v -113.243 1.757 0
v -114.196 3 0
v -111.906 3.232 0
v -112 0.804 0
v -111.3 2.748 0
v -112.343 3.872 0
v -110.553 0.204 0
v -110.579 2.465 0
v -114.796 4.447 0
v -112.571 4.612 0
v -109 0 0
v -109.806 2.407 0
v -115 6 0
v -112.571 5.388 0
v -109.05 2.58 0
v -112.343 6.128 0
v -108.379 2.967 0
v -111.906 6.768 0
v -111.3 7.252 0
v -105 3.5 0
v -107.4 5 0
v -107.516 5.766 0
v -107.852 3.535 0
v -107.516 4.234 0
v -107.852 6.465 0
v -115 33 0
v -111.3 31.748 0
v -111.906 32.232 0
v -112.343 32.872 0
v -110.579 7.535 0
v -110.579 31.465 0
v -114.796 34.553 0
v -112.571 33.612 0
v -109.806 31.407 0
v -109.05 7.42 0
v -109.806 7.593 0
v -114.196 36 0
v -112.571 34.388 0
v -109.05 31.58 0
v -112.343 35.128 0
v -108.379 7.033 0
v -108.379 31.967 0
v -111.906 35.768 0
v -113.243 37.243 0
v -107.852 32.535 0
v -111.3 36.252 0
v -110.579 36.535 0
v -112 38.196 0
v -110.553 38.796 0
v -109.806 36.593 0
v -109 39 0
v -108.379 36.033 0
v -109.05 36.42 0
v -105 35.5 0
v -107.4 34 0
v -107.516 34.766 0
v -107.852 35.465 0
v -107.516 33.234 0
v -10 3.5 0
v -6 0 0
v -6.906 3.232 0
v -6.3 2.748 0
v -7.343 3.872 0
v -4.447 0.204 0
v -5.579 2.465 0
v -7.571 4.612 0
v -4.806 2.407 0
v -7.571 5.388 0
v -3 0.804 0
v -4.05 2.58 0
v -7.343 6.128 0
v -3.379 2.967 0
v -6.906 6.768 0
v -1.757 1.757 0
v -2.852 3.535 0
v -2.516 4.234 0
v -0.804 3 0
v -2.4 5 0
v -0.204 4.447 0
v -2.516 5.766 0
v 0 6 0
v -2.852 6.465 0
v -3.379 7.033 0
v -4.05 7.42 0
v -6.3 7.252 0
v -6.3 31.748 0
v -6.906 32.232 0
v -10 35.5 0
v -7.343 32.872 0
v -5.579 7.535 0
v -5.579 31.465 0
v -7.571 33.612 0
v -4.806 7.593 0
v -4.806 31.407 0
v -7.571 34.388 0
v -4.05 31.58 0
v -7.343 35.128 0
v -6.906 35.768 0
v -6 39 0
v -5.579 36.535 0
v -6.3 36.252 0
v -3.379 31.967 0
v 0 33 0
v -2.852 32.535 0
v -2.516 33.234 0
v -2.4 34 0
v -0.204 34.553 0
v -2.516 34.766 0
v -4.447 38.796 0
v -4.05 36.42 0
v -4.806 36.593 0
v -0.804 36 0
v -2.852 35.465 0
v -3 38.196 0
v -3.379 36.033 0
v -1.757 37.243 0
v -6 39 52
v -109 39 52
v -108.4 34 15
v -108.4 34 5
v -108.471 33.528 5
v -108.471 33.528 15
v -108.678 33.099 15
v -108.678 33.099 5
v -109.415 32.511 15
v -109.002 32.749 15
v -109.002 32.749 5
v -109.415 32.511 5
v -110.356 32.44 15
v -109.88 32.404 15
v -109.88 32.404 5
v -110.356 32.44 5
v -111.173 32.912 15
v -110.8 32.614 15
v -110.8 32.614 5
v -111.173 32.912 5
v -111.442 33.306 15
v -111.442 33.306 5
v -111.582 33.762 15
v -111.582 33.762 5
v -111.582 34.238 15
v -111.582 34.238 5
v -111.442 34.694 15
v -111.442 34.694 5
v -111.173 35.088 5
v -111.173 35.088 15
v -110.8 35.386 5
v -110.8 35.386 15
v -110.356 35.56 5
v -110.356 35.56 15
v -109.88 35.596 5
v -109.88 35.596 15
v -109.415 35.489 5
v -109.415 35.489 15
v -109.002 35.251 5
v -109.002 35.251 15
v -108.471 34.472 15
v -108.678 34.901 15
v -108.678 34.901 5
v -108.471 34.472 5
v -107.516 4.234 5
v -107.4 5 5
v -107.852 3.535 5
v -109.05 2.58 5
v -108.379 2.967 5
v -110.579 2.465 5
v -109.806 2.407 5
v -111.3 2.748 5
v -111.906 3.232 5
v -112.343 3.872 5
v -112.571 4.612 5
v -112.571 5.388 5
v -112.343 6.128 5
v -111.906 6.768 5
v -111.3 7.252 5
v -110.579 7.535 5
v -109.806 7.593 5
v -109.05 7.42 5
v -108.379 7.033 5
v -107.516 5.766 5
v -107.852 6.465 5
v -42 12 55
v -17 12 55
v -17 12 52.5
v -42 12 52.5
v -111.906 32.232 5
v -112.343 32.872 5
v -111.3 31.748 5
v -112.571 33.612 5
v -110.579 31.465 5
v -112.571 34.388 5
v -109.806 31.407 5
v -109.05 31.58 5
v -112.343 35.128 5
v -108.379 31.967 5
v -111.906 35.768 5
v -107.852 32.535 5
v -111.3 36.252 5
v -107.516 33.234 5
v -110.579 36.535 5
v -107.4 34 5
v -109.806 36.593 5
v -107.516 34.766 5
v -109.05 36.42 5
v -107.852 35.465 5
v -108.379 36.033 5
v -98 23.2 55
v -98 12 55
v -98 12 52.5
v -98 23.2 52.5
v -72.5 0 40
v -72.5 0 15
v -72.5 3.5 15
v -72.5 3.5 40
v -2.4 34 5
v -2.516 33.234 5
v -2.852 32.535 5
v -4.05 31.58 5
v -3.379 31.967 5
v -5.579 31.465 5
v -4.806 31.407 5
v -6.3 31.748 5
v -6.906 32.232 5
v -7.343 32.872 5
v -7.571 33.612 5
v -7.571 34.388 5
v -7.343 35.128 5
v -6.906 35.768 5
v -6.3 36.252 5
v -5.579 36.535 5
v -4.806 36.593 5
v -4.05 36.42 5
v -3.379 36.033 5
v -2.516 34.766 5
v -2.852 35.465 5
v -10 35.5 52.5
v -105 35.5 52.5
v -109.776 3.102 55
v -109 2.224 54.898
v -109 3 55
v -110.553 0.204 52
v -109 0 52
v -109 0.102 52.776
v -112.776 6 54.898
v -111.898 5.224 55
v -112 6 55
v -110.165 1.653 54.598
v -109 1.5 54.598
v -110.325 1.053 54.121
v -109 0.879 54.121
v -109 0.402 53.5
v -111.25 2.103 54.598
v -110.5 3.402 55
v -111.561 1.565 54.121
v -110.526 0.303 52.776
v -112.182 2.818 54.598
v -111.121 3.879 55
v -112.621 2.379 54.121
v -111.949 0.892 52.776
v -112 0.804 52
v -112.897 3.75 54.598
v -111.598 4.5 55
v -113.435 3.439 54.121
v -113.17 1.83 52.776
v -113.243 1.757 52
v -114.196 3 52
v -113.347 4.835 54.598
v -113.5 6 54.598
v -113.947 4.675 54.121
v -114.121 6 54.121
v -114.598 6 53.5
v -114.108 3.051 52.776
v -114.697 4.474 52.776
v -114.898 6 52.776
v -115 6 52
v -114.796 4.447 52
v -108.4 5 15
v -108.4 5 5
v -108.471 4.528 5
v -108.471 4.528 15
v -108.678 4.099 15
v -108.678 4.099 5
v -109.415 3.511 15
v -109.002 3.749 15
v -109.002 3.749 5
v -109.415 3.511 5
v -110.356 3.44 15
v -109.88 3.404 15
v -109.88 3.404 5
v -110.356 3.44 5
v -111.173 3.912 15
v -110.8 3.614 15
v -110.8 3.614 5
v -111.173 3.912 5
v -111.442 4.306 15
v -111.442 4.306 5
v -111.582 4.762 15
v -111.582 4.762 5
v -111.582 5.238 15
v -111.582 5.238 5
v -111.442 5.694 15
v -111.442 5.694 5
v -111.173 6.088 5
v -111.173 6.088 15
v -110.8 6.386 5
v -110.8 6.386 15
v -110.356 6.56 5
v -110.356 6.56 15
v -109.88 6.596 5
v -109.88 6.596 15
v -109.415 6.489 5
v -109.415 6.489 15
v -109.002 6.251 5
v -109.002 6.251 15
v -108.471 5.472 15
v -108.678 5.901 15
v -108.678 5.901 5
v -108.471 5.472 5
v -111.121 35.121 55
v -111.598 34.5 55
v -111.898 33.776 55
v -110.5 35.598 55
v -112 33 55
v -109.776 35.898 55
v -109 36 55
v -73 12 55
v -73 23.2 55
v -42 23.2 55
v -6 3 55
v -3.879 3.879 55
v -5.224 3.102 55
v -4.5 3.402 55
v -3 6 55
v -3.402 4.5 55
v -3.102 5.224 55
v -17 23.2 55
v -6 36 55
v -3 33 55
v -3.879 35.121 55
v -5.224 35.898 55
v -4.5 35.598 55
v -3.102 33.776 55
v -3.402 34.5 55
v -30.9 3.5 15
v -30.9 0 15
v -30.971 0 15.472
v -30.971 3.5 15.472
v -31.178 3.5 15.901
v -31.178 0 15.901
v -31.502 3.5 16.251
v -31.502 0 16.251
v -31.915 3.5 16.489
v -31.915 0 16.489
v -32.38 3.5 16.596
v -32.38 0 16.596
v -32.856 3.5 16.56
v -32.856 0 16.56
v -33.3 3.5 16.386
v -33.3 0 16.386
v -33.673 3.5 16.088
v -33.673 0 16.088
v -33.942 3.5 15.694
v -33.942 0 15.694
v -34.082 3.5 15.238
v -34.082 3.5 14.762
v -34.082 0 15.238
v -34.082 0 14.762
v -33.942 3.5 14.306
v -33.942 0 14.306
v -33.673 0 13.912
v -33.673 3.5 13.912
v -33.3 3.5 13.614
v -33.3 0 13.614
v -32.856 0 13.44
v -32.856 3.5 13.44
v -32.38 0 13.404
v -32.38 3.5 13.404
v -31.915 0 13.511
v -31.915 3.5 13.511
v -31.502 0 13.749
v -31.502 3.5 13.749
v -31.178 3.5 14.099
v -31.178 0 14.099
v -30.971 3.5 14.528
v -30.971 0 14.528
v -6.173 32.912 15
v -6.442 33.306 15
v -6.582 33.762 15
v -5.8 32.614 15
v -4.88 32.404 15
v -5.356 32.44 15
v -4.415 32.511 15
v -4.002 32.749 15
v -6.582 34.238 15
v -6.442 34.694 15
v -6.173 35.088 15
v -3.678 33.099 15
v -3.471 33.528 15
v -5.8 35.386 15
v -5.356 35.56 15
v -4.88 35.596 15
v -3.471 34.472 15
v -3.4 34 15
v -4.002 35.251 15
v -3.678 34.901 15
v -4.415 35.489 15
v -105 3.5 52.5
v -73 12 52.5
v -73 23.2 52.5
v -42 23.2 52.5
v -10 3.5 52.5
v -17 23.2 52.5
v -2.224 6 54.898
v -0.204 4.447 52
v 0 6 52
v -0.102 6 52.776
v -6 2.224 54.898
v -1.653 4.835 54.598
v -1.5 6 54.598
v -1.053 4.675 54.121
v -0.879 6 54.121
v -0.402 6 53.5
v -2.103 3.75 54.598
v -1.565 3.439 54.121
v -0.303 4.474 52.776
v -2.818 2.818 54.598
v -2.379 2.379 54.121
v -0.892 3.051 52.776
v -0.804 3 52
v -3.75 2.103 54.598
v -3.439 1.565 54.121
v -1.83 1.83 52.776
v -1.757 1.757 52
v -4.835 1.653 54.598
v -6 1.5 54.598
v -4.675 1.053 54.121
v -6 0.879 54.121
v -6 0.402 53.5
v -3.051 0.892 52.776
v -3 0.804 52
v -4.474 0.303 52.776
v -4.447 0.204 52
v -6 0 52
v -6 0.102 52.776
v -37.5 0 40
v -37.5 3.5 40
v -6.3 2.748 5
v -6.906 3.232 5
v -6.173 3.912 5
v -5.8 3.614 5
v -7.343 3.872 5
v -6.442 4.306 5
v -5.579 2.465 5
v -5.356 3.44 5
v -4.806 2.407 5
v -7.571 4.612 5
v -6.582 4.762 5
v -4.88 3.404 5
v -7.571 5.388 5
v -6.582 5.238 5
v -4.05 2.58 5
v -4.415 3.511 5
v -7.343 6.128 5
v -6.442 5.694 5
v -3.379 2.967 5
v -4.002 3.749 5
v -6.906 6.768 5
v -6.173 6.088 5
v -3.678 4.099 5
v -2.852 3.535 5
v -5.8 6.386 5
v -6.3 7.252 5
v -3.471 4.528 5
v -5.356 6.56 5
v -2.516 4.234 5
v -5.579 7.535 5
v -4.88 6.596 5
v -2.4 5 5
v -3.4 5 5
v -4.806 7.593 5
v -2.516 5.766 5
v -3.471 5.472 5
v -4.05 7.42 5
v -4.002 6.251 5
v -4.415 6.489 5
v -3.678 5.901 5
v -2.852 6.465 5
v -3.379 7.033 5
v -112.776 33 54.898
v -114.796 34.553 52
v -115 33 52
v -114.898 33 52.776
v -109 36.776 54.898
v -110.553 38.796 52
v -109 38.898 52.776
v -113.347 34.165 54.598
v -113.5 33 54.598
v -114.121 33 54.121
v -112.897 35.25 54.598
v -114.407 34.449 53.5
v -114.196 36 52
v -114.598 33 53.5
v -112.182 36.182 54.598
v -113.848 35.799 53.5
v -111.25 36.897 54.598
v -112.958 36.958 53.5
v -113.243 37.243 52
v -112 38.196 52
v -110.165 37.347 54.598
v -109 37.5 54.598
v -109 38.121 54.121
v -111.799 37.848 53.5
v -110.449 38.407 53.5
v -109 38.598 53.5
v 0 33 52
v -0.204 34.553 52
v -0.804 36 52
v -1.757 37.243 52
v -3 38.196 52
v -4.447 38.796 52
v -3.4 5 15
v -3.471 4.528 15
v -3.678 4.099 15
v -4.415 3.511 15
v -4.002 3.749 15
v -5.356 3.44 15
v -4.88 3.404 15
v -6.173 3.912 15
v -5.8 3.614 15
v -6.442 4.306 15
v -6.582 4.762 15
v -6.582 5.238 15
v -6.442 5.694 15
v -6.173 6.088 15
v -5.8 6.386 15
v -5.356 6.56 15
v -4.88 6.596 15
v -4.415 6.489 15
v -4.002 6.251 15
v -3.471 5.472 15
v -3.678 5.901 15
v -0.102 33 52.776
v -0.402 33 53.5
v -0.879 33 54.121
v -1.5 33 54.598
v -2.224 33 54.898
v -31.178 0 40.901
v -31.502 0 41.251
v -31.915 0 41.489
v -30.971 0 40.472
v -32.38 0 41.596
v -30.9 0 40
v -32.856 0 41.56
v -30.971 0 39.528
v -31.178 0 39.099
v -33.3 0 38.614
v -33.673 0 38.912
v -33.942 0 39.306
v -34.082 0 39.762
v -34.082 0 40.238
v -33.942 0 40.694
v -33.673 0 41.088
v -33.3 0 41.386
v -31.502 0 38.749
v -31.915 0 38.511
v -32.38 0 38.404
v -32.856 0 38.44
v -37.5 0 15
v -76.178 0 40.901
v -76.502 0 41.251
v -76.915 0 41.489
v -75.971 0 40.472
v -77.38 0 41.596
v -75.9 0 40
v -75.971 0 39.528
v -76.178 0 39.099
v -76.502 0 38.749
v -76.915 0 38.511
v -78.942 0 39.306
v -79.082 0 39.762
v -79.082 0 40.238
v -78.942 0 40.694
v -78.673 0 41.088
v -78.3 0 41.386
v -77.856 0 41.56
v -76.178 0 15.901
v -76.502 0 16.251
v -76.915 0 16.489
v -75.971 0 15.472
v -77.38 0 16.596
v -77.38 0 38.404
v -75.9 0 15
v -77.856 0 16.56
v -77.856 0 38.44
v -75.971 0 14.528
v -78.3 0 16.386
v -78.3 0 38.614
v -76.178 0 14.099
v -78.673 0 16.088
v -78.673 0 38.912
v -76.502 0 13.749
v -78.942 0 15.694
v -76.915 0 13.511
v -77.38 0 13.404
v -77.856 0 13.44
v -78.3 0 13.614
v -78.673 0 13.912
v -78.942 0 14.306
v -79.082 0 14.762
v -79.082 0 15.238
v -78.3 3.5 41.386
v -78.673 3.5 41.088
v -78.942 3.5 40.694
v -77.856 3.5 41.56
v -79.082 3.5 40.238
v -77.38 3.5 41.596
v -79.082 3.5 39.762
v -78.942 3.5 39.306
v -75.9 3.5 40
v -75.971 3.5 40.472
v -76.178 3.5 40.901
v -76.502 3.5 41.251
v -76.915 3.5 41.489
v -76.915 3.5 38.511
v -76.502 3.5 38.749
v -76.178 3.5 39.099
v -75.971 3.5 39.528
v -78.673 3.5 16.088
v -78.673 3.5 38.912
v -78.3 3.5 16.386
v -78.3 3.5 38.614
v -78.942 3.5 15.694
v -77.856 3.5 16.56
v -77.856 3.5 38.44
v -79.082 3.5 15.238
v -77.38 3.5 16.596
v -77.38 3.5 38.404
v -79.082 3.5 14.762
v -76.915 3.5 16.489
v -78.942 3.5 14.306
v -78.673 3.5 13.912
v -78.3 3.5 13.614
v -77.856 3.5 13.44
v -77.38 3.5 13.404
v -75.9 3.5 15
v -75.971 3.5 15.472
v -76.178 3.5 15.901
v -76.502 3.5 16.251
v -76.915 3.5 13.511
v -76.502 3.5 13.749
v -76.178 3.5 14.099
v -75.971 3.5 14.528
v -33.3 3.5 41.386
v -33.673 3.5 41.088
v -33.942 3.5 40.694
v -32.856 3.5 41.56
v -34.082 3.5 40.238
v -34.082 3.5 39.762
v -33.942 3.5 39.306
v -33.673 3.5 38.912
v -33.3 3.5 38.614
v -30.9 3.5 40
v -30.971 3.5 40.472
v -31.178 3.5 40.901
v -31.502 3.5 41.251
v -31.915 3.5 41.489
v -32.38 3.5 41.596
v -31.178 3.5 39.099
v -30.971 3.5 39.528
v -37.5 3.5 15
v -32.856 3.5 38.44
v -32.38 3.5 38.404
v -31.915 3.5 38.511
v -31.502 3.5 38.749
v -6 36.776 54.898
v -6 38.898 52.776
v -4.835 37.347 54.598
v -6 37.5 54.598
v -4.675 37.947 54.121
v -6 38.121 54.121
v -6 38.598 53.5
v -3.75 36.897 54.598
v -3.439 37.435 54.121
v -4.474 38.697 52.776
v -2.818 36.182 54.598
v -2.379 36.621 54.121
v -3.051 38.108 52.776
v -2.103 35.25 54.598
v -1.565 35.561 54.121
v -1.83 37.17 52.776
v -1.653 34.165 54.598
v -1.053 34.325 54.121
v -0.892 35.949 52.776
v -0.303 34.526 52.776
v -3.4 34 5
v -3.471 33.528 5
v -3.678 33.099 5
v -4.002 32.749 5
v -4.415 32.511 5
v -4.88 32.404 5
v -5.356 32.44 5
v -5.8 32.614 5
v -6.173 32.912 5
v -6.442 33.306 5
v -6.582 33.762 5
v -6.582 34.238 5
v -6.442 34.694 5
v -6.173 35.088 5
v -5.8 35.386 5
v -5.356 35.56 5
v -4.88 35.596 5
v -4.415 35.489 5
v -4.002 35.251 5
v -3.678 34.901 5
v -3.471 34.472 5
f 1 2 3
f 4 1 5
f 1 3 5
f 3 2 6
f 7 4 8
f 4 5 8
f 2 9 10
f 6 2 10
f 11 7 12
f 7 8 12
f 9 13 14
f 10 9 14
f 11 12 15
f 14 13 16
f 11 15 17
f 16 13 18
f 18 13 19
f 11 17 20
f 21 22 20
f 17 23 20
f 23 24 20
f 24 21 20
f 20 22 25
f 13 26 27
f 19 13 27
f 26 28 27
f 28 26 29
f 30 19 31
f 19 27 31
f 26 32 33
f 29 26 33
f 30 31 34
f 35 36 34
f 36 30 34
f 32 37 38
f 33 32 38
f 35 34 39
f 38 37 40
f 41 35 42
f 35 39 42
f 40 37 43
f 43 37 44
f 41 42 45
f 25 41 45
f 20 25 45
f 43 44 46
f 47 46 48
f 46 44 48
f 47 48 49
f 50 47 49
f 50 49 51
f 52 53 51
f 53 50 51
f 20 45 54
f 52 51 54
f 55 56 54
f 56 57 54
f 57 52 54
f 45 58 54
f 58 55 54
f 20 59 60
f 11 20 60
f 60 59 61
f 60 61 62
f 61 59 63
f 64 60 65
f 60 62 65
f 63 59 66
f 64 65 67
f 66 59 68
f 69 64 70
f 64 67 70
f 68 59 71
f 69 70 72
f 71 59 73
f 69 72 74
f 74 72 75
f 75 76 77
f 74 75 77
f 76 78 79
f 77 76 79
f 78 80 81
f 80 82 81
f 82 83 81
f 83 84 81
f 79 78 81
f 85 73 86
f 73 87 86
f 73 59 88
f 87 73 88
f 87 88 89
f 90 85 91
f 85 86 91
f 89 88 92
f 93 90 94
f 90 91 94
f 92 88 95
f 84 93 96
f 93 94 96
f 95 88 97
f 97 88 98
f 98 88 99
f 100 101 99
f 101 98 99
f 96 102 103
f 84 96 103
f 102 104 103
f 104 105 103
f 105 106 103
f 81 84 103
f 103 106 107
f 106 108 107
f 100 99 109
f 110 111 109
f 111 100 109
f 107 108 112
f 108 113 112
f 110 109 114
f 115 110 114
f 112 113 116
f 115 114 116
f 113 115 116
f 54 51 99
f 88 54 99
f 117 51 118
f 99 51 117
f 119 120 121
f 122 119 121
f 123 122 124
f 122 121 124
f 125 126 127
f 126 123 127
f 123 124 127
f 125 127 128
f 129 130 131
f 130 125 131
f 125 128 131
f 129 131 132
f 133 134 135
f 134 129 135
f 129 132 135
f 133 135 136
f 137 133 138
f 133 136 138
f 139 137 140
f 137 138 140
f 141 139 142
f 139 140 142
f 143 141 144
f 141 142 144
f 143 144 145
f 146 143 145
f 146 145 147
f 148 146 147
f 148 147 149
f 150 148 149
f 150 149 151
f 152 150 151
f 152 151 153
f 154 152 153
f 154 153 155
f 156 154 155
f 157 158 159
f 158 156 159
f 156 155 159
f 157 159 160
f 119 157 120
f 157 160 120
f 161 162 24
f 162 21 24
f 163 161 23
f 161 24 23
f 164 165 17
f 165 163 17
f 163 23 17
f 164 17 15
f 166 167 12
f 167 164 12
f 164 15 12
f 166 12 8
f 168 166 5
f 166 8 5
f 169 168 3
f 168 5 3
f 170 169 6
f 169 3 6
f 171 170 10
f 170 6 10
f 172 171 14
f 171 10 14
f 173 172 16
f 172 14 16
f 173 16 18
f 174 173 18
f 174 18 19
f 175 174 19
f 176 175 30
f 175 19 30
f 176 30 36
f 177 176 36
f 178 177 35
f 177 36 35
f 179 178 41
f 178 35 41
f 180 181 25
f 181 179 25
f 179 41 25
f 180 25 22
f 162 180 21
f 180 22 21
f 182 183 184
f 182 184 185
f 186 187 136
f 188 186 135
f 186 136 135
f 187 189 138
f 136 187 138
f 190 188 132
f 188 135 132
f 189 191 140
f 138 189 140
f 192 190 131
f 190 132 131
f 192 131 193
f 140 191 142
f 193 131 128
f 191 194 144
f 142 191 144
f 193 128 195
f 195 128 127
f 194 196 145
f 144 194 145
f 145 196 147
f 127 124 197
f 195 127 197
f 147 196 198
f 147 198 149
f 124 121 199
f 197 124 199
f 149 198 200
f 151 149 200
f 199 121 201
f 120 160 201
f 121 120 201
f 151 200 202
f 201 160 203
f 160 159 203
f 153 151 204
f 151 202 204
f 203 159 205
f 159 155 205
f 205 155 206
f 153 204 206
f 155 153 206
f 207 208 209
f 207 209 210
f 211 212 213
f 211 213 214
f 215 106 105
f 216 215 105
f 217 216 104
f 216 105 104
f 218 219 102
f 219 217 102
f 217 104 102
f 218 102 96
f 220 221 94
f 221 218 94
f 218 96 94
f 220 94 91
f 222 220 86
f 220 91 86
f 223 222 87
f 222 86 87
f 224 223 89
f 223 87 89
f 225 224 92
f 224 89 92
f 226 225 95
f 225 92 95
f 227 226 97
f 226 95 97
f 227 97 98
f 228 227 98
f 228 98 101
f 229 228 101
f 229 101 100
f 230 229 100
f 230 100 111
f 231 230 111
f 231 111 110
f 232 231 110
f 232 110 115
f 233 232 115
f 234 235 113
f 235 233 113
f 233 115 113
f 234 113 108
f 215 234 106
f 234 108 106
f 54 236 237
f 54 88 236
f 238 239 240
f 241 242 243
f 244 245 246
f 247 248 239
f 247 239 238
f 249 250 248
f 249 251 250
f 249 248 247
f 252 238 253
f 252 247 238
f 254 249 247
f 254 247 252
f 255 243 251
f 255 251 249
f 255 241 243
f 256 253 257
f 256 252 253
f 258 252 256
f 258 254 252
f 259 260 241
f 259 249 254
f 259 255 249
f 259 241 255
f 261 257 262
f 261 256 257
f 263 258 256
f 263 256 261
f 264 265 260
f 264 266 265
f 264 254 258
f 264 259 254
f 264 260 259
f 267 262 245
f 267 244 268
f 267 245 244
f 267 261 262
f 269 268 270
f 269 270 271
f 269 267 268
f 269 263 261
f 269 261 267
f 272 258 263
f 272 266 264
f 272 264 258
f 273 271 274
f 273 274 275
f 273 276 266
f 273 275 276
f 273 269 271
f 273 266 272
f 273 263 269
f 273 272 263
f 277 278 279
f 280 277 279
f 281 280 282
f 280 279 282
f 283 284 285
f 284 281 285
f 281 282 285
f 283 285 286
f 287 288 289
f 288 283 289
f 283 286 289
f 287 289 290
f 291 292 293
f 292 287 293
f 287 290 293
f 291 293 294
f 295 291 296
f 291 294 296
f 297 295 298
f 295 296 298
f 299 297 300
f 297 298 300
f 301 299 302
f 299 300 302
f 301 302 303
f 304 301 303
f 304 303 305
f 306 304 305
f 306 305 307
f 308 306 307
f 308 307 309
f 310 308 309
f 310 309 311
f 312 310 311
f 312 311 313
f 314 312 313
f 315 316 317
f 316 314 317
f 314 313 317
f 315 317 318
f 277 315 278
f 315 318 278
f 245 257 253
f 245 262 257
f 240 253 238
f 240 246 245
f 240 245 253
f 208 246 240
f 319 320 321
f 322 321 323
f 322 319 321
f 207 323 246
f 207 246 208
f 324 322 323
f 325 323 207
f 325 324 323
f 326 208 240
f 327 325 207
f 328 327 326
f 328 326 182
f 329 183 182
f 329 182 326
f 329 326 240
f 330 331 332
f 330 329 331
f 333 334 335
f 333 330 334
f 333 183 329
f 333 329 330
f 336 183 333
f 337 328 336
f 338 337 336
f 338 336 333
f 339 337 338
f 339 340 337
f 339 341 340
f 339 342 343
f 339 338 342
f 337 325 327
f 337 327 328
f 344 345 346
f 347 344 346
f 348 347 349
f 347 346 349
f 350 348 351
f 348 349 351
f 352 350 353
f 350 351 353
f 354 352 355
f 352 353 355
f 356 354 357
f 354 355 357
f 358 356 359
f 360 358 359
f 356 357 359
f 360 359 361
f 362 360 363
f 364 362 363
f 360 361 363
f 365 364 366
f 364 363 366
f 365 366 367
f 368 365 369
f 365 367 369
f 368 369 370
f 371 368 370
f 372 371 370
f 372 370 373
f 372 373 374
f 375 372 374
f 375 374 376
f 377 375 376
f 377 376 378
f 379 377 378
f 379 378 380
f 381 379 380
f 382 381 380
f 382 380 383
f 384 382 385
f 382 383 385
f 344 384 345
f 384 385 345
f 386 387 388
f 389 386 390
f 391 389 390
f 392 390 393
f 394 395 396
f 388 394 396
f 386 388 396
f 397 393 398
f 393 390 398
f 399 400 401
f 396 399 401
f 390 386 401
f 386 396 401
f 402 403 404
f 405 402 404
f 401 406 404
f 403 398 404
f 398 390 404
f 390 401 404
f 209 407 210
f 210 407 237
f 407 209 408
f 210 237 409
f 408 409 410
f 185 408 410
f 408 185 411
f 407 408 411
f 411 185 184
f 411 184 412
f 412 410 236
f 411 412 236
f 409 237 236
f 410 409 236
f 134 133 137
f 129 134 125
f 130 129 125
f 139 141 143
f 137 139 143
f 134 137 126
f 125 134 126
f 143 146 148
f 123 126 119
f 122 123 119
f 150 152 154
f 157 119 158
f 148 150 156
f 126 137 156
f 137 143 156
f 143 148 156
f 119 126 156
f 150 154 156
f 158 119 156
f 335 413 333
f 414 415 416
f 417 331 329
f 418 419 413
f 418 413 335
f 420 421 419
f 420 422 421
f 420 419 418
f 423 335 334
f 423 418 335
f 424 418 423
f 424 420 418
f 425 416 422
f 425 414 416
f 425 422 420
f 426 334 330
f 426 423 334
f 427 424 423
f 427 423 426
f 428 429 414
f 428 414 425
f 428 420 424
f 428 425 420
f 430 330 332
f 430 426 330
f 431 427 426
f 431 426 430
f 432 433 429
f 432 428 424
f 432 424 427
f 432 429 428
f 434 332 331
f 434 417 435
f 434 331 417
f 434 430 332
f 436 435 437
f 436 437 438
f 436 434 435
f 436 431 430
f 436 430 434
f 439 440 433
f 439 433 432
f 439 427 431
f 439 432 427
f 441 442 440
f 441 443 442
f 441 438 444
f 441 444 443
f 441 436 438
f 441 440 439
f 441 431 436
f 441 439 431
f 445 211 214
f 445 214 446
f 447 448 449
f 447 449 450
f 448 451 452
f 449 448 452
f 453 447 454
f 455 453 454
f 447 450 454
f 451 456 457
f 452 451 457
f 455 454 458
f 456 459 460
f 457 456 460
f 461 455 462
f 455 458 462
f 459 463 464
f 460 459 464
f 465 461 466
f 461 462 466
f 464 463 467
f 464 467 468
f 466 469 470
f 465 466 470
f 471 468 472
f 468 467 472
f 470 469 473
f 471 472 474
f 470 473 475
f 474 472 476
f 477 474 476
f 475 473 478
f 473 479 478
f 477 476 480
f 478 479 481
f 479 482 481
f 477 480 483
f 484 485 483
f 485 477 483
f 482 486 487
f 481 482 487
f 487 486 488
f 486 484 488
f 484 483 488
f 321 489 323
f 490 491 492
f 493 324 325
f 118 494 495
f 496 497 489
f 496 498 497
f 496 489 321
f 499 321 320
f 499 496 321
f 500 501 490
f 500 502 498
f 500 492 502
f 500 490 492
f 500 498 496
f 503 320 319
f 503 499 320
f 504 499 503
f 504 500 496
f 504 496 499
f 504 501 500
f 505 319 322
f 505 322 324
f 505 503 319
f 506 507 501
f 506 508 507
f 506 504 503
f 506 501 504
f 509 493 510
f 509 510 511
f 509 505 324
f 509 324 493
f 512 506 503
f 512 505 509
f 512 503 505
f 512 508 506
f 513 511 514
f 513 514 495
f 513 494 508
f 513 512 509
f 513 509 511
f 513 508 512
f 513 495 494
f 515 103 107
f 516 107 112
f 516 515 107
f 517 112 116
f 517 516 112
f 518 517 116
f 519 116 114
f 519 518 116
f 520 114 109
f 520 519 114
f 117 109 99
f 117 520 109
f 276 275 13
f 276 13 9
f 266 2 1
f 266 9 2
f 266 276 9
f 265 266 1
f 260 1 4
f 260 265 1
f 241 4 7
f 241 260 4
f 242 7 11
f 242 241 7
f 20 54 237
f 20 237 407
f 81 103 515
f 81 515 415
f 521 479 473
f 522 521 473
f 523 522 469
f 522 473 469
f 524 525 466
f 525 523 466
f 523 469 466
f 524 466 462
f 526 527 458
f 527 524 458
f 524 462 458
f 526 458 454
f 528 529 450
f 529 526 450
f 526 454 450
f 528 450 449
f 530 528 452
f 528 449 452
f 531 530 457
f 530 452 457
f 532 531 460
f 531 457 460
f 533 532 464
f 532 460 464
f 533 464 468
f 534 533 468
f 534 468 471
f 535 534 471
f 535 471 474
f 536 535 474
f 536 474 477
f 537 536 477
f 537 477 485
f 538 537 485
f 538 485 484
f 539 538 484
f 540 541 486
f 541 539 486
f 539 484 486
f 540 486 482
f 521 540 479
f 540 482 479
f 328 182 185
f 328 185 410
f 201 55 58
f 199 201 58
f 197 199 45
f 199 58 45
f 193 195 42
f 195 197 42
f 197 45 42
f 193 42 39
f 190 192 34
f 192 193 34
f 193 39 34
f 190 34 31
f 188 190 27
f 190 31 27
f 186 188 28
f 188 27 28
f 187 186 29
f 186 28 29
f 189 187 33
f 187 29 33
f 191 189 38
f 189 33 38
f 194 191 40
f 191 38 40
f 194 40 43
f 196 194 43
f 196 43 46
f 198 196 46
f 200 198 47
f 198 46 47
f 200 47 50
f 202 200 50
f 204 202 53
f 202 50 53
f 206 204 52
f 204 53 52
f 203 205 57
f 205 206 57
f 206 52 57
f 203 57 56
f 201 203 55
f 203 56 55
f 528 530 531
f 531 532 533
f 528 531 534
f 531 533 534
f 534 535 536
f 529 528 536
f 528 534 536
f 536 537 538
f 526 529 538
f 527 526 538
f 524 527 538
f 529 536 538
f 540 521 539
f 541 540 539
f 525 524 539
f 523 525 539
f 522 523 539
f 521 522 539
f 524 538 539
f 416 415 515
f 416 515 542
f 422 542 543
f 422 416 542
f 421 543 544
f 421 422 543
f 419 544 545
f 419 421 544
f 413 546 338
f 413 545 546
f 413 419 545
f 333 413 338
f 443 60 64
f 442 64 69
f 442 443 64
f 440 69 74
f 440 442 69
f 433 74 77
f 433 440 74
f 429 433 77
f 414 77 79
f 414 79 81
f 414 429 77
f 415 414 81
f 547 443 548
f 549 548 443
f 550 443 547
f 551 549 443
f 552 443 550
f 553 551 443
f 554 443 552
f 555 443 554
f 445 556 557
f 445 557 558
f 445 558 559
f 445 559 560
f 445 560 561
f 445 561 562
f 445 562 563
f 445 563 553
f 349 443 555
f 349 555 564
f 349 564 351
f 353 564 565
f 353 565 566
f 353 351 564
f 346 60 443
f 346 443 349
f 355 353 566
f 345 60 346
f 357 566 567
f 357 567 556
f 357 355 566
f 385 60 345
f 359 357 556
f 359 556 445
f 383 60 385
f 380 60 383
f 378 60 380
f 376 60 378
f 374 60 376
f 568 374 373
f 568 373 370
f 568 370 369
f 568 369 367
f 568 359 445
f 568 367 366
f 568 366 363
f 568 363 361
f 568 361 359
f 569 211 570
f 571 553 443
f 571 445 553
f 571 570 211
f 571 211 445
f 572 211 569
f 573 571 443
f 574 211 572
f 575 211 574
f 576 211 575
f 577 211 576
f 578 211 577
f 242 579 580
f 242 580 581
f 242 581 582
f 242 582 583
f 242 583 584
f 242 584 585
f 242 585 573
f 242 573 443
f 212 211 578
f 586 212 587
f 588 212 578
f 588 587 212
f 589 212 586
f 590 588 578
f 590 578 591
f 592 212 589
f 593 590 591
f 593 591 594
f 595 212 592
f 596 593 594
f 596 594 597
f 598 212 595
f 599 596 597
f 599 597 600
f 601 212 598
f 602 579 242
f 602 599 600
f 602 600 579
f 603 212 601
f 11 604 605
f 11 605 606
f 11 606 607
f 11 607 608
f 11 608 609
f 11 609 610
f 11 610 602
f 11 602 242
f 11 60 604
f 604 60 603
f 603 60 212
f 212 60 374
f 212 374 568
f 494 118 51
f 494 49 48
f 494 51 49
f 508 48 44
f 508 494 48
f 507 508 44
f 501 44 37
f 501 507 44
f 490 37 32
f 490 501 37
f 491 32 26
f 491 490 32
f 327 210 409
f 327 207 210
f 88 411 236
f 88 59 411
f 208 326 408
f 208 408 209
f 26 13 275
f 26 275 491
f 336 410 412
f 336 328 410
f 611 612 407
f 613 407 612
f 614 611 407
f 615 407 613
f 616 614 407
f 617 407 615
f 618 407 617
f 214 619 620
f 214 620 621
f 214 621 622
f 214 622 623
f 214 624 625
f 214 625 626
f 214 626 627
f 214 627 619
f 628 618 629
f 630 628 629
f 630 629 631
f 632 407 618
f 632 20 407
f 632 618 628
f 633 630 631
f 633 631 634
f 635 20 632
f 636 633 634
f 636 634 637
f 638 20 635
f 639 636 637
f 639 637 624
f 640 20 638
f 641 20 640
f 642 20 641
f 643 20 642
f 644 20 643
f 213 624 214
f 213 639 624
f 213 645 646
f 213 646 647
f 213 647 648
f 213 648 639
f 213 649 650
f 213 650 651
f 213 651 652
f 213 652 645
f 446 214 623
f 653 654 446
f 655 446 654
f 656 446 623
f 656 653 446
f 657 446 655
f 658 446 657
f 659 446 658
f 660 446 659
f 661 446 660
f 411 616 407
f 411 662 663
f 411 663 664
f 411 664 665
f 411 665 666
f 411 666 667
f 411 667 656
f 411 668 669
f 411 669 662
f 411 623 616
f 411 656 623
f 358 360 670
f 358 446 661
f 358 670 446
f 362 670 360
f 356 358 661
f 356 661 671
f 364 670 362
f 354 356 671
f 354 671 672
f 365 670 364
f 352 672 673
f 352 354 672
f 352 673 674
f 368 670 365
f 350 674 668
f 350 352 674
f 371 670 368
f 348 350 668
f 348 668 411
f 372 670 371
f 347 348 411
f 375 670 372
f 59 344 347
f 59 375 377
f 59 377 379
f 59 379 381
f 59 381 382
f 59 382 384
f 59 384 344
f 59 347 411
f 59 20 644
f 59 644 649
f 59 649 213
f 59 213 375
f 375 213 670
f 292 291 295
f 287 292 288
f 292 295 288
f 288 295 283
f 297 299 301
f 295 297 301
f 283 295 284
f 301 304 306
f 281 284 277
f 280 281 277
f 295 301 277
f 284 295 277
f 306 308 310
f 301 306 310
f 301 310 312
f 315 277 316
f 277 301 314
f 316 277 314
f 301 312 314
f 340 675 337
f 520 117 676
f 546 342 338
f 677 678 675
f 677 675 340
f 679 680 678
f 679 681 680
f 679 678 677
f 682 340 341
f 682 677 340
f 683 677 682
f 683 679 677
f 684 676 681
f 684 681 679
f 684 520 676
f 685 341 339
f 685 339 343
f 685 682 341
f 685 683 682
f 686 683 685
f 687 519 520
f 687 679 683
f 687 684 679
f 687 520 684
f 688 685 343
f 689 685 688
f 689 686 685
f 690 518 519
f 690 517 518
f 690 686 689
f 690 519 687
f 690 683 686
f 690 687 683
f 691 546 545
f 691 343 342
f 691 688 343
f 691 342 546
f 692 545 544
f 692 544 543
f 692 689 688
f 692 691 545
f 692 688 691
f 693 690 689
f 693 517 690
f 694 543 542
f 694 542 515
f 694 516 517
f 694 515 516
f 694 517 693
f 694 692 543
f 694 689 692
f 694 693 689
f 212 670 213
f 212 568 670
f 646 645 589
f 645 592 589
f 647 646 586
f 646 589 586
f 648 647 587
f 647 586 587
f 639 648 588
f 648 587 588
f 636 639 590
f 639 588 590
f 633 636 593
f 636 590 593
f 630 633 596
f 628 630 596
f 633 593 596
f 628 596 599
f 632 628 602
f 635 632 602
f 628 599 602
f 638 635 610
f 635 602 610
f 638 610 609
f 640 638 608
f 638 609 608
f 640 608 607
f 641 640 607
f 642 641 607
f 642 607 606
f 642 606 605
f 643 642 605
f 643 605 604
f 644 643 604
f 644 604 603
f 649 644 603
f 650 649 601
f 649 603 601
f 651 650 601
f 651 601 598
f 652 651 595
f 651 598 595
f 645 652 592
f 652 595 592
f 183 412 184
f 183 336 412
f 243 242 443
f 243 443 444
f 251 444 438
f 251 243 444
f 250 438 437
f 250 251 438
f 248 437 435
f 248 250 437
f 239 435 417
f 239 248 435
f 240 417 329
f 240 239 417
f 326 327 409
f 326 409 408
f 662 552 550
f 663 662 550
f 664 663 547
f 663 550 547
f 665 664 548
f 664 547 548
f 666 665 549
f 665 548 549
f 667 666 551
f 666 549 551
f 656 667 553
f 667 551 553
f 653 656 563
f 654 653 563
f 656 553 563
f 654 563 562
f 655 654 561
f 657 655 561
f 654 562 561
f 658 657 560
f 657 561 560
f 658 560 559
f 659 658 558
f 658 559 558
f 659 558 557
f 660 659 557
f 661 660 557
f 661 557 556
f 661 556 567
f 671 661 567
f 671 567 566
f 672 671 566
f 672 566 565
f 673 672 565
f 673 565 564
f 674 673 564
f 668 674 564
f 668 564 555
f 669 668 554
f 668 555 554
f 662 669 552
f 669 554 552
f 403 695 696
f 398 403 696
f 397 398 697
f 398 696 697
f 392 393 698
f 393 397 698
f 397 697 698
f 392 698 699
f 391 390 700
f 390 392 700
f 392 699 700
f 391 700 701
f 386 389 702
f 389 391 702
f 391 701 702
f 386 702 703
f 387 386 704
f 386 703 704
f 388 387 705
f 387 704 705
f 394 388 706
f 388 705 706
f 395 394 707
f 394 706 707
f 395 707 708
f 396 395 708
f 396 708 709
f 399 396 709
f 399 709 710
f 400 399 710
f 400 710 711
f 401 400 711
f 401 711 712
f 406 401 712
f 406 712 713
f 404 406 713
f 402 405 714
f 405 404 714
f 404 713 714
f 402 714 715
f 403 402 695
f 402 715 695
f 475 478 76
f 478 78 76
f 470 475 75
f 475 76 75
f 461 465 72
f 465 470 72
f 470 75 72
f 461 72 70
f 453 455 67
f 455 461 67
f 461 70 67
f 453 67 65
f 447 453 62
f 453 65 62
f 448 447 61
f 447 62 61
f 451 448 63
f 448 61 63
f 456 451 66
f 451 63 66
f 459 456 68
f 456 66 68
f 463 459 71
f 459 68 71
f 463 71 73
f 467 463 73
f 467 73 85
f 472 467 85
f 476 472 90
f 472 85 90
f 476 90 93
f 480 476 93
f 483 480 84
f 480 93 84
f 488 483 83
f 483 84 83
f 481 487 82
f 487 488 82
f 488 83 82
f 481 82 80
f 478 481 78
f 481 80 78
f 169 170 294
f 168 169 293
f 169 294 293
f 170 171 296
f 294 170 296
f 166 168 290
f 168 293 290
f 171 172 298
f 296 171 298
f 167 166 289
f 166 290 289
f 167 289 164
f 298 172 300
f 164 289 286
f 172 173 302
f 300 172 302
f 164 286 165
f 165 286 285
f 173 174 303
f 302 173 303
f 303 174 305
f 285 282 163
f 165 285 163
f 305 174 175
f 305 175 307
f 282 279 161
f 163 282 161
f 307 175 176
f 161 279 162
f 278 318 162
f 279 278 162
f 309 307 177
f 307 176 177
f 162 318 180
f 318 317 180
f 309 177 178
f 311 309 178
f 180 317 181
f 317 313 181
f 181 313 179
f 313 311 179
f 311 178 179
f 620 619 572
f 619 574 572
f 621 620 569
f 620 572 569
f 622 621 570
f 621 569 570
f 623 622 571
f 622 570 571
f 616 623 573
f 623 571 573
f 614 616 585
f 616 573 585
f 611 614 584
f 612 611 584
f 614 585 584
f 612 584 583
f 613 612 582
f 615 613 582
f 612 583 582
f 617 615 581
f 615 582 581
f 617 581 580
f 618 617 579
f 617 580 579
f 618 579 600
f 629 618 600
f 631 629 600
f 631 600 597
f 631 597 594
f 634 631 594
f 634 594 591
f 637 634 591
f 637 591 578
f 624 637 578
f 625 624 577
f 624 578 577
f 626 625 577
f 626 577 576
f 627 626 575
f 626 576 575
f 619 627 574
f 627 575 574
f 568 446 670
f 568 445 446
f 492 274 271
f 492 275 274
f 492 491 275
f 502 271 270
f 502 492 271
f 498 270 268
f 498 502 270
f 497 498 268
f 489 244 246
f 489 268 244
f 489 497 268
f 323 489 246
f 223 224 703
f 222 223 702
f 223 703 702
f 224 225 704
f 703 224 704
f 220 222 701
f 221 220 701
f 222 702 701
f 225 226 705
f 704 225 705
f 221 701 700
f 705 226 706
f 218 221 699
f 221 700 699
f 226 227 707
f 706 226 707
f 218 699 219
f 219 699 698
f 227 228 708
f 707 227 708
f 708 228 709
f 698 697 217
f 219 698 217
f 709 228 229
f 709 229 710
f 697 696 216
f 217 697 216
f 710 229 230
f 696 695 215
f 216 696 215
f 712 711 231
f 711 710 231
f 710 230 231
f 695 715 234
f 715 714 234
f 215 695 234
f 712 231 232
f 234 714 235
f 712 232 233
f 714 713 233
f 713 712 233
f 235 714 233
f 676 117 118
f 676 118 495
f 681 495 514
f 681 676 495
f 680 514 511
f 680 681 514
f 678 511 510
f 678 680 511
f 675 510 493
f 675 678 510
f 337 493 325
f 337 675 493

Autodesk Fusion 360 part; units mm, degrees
sketch "Sketch1" plane through (0, 0, 0) normal (0, 0, 1) x (1, 0, 0)
  line L0 (0, 0) -> (-115, 0)
  line L1 (-115, 0) -> (-115, 39)
  line L2 (-115, 39) -> (0, 39)
  line L3 (0, 39) -> (0, 0)
  circle A0 centre (-5, 34) radius 2.6
  circle A1 centre (-5, 34) radius 1.6
  circle A2 centre (-5, 5) radius 2.6
  circle A3 centre (-5, 5) radius 1.6
  circle A4 centre (-110, 5) radius 2.6
  circle A5 centre (-110, 5) radius 1.6
  circle A6 centre (-110, 34) radius 2.6
  circle A7 centre (-110, 34) radius 1.6
  line L4 (-10, 35.5) -> (-105, 35.5)
  line L5 (-105, 35.5) -> (-105, 3.5)
  line L6 (-105, 3.5) -> (-10, 3.5)
  line L7 (-10, 3.5) -> (-10, 35.5)
  dimension "d1" = 115
  dimension "d2" = 39
  dimension "d3" = 5.2
  dimension "d4" = 5
  dimension "d5" = 5
  dimension "d6" = 3.2
  dimension "d7" = 5.2
  dimension "d8" = 5
  dimension "d9" = 5
  dimension "d10" = 3.2
  dimension "d11" = 5.2
  dimension "d12" = 5
  dimension "d13" = 5
  dimension "d14" = 3.2
  dimension "d15" = 5.2
  dimension "d16" = 5
  dimension "d17" = 5
  dimension "d18" = 3.2
  dimension "d19" = 95
  dimension "d20" = 32
  dimension "d21" = 10
  dimension "d22" = 3.5
extrude "Extrude1" add sketch "Sketch1" along normal blind 55 contours L0 L1 L2 L3 | A0 | A1 | A2 | A3 | A4 | A5 | A6 | A7 | L4 L5 L6 L7
extrude "Extrude2" cut sketch "Sketch1" along normal blind 52.5 contours L4 L5 L6 L7
extrude "Extrude3" cut sketch "Sketch1" along normal blind 5 contours A0 | A2 | A4 | A6
extrude "Extrude4" cut sketch "Sketch1" along normal blind 15 contours A1 | A3 | A5 | A7
sketch "Sketch2" plane through (0, 0, 0) normal (0, 1, 0) x (1, 0, 0)
  line L0 (-27.5, -10) -> (-82.5, -10)
  line L1 (-82.5, -10) -> (-82.5, -45)
  line L2 (-82.5, -45) -> (-27.5, -45)
  line L3 (-27.5, -45) -> (-27.5, -10)
  line L4 (-37.5, -15) -> (-72.5, -15)
  line L5 (-72.5, -15) -> (-72.5, -40)
  line L6 (-72.5, -40) -> (-37.5, -40)
  line L7 (-37.5, -40) -> (-37.5, -15)
  circle A0 centre (-32.5, -15) radius 1.6
  circle A1 centre (-32.5, -40) radius 1.6
  circle A2 centre (-77.5, -15) radius 1.6
  circle A3 centre (-77.5, -40) radius 1.6
  line L8 (0, 0) -> (-115, 0)
  line L9 (0, 0) -> (0, -55)
  dimension "d31" = 55
  dimension "d32" = 35
  dimension "d33" = 35
  dimension "d34" = 25
  dimension "d35" = 10
  dimension "d36" = 5
  dimension "d37" = 3.2
  dimension "d38" = 5
  dimension "d39" = 5
  dimension "d40" = 3.2
  dimension "d41" = 5
  dimension "d42" = 5
  dimension "d43" = 3.2
  dimension "d44" = 5
  dimension "d45" = 5
  dimension "d46" = 3.2
  dimension "d47" = 5
  dimension "d48" = 5
  dimension "d49" = 10
  dimension "d50" = 27.5
extrude "Extrude5" cut sketch "Sketch2" along normal blind 15 contours L4 L5 L6 L7
extrude "Extrude6" cut sketch "Sketch2" along normal blind 10 contours A0 | A1 | A2 | A3
ref_plane "WorkPlane1" through (0, 0, 60) normal (0, 0, 1) x (1, 0, 0)
sketch "Sketch3" plane through (0, 0, 60) normal (0, 0, 1) x (1, 0, 0)
  line L0 (-98, 23.2) -> (-73, 23.2)
  line L1 (-73, 23.2) -> (-73, 12)
  line L2 (-73, 12) -> (-98, 12)
  line L3 (-98, 12) -> (-98, 23.2)
  line L4 (-42, 23.2) -> (-17, 23.2)
  line L5 (-17, 23.2) -> (-17, 12)
  line L6 (-17, 12) -> (-42, 12)
  line L7 (-42, 12) -> (-42, 23.2)
  line L8 (0, 39) -> (-115, 39)
  line L9 (-99, 30.7) -> (-72, 30.7)
  line L10 (-72, 30.7) -> (-72, 3.7)
  line L11 (-72, 3.7) -> (-99, 3.7)
  line L12 (-99, 3.7) -> (-99, 30.7)
  line L13 (-43, 30.7) -> (-16, 30.7)
  line L14 (-16, 30.7) -> (-16, 3.7)
  line L15 (-16, 3.7) -> (-43, 3.7)
  line L16 (-43, 3.7) -> (-43, 30.7)
  line L17 (-115, 0) -> (0, 0)
  line L18 (-115, 39) -> (-115, 0)
  line L19 (0, 0) -> (0, 39)
  dimension "d56" = 25
  dimension "d57" = 11.2
  dimension "d58" = 25
  dimension "d59" = 11.2
  dimension "d61" = 27
  dimension "d62" = 27
  dimension "d63" = 7.5
  dimension "d64" = 1
  dimension "d65" = 27
  dimension "d66" = 27
  dimension "d67" = 1
  dimension "d68" = 7.5
  dimension "d69" = 3.7
  dimension "d70" = 3.7
  dimension "d73" = 16
  dimension "d74" = 16
extrude "Extrude7" cut sketch "Sketch3" against normal blind 25 contours L0 L1 L2 L3 | L4 L5 L6 L7
fillet "Fillet1" radius 6 4 edges at (0, 39, 27.5) (-115, 39, 27.5) (0, 0, 27.5) (-115, 0, 27.5)
fillet "Fillet2" radius 3 8 edges at (-113.2426, 37.2426, 55) (-115, 19.5, 55) (-113.2426, 1.7574, 55) (-57.5, 0, 55) (-1.7574, 1.7574, 55) (0, 19.5, 55) (-1.7574, 37.2426, 55) (-57.5, 39, 55)
